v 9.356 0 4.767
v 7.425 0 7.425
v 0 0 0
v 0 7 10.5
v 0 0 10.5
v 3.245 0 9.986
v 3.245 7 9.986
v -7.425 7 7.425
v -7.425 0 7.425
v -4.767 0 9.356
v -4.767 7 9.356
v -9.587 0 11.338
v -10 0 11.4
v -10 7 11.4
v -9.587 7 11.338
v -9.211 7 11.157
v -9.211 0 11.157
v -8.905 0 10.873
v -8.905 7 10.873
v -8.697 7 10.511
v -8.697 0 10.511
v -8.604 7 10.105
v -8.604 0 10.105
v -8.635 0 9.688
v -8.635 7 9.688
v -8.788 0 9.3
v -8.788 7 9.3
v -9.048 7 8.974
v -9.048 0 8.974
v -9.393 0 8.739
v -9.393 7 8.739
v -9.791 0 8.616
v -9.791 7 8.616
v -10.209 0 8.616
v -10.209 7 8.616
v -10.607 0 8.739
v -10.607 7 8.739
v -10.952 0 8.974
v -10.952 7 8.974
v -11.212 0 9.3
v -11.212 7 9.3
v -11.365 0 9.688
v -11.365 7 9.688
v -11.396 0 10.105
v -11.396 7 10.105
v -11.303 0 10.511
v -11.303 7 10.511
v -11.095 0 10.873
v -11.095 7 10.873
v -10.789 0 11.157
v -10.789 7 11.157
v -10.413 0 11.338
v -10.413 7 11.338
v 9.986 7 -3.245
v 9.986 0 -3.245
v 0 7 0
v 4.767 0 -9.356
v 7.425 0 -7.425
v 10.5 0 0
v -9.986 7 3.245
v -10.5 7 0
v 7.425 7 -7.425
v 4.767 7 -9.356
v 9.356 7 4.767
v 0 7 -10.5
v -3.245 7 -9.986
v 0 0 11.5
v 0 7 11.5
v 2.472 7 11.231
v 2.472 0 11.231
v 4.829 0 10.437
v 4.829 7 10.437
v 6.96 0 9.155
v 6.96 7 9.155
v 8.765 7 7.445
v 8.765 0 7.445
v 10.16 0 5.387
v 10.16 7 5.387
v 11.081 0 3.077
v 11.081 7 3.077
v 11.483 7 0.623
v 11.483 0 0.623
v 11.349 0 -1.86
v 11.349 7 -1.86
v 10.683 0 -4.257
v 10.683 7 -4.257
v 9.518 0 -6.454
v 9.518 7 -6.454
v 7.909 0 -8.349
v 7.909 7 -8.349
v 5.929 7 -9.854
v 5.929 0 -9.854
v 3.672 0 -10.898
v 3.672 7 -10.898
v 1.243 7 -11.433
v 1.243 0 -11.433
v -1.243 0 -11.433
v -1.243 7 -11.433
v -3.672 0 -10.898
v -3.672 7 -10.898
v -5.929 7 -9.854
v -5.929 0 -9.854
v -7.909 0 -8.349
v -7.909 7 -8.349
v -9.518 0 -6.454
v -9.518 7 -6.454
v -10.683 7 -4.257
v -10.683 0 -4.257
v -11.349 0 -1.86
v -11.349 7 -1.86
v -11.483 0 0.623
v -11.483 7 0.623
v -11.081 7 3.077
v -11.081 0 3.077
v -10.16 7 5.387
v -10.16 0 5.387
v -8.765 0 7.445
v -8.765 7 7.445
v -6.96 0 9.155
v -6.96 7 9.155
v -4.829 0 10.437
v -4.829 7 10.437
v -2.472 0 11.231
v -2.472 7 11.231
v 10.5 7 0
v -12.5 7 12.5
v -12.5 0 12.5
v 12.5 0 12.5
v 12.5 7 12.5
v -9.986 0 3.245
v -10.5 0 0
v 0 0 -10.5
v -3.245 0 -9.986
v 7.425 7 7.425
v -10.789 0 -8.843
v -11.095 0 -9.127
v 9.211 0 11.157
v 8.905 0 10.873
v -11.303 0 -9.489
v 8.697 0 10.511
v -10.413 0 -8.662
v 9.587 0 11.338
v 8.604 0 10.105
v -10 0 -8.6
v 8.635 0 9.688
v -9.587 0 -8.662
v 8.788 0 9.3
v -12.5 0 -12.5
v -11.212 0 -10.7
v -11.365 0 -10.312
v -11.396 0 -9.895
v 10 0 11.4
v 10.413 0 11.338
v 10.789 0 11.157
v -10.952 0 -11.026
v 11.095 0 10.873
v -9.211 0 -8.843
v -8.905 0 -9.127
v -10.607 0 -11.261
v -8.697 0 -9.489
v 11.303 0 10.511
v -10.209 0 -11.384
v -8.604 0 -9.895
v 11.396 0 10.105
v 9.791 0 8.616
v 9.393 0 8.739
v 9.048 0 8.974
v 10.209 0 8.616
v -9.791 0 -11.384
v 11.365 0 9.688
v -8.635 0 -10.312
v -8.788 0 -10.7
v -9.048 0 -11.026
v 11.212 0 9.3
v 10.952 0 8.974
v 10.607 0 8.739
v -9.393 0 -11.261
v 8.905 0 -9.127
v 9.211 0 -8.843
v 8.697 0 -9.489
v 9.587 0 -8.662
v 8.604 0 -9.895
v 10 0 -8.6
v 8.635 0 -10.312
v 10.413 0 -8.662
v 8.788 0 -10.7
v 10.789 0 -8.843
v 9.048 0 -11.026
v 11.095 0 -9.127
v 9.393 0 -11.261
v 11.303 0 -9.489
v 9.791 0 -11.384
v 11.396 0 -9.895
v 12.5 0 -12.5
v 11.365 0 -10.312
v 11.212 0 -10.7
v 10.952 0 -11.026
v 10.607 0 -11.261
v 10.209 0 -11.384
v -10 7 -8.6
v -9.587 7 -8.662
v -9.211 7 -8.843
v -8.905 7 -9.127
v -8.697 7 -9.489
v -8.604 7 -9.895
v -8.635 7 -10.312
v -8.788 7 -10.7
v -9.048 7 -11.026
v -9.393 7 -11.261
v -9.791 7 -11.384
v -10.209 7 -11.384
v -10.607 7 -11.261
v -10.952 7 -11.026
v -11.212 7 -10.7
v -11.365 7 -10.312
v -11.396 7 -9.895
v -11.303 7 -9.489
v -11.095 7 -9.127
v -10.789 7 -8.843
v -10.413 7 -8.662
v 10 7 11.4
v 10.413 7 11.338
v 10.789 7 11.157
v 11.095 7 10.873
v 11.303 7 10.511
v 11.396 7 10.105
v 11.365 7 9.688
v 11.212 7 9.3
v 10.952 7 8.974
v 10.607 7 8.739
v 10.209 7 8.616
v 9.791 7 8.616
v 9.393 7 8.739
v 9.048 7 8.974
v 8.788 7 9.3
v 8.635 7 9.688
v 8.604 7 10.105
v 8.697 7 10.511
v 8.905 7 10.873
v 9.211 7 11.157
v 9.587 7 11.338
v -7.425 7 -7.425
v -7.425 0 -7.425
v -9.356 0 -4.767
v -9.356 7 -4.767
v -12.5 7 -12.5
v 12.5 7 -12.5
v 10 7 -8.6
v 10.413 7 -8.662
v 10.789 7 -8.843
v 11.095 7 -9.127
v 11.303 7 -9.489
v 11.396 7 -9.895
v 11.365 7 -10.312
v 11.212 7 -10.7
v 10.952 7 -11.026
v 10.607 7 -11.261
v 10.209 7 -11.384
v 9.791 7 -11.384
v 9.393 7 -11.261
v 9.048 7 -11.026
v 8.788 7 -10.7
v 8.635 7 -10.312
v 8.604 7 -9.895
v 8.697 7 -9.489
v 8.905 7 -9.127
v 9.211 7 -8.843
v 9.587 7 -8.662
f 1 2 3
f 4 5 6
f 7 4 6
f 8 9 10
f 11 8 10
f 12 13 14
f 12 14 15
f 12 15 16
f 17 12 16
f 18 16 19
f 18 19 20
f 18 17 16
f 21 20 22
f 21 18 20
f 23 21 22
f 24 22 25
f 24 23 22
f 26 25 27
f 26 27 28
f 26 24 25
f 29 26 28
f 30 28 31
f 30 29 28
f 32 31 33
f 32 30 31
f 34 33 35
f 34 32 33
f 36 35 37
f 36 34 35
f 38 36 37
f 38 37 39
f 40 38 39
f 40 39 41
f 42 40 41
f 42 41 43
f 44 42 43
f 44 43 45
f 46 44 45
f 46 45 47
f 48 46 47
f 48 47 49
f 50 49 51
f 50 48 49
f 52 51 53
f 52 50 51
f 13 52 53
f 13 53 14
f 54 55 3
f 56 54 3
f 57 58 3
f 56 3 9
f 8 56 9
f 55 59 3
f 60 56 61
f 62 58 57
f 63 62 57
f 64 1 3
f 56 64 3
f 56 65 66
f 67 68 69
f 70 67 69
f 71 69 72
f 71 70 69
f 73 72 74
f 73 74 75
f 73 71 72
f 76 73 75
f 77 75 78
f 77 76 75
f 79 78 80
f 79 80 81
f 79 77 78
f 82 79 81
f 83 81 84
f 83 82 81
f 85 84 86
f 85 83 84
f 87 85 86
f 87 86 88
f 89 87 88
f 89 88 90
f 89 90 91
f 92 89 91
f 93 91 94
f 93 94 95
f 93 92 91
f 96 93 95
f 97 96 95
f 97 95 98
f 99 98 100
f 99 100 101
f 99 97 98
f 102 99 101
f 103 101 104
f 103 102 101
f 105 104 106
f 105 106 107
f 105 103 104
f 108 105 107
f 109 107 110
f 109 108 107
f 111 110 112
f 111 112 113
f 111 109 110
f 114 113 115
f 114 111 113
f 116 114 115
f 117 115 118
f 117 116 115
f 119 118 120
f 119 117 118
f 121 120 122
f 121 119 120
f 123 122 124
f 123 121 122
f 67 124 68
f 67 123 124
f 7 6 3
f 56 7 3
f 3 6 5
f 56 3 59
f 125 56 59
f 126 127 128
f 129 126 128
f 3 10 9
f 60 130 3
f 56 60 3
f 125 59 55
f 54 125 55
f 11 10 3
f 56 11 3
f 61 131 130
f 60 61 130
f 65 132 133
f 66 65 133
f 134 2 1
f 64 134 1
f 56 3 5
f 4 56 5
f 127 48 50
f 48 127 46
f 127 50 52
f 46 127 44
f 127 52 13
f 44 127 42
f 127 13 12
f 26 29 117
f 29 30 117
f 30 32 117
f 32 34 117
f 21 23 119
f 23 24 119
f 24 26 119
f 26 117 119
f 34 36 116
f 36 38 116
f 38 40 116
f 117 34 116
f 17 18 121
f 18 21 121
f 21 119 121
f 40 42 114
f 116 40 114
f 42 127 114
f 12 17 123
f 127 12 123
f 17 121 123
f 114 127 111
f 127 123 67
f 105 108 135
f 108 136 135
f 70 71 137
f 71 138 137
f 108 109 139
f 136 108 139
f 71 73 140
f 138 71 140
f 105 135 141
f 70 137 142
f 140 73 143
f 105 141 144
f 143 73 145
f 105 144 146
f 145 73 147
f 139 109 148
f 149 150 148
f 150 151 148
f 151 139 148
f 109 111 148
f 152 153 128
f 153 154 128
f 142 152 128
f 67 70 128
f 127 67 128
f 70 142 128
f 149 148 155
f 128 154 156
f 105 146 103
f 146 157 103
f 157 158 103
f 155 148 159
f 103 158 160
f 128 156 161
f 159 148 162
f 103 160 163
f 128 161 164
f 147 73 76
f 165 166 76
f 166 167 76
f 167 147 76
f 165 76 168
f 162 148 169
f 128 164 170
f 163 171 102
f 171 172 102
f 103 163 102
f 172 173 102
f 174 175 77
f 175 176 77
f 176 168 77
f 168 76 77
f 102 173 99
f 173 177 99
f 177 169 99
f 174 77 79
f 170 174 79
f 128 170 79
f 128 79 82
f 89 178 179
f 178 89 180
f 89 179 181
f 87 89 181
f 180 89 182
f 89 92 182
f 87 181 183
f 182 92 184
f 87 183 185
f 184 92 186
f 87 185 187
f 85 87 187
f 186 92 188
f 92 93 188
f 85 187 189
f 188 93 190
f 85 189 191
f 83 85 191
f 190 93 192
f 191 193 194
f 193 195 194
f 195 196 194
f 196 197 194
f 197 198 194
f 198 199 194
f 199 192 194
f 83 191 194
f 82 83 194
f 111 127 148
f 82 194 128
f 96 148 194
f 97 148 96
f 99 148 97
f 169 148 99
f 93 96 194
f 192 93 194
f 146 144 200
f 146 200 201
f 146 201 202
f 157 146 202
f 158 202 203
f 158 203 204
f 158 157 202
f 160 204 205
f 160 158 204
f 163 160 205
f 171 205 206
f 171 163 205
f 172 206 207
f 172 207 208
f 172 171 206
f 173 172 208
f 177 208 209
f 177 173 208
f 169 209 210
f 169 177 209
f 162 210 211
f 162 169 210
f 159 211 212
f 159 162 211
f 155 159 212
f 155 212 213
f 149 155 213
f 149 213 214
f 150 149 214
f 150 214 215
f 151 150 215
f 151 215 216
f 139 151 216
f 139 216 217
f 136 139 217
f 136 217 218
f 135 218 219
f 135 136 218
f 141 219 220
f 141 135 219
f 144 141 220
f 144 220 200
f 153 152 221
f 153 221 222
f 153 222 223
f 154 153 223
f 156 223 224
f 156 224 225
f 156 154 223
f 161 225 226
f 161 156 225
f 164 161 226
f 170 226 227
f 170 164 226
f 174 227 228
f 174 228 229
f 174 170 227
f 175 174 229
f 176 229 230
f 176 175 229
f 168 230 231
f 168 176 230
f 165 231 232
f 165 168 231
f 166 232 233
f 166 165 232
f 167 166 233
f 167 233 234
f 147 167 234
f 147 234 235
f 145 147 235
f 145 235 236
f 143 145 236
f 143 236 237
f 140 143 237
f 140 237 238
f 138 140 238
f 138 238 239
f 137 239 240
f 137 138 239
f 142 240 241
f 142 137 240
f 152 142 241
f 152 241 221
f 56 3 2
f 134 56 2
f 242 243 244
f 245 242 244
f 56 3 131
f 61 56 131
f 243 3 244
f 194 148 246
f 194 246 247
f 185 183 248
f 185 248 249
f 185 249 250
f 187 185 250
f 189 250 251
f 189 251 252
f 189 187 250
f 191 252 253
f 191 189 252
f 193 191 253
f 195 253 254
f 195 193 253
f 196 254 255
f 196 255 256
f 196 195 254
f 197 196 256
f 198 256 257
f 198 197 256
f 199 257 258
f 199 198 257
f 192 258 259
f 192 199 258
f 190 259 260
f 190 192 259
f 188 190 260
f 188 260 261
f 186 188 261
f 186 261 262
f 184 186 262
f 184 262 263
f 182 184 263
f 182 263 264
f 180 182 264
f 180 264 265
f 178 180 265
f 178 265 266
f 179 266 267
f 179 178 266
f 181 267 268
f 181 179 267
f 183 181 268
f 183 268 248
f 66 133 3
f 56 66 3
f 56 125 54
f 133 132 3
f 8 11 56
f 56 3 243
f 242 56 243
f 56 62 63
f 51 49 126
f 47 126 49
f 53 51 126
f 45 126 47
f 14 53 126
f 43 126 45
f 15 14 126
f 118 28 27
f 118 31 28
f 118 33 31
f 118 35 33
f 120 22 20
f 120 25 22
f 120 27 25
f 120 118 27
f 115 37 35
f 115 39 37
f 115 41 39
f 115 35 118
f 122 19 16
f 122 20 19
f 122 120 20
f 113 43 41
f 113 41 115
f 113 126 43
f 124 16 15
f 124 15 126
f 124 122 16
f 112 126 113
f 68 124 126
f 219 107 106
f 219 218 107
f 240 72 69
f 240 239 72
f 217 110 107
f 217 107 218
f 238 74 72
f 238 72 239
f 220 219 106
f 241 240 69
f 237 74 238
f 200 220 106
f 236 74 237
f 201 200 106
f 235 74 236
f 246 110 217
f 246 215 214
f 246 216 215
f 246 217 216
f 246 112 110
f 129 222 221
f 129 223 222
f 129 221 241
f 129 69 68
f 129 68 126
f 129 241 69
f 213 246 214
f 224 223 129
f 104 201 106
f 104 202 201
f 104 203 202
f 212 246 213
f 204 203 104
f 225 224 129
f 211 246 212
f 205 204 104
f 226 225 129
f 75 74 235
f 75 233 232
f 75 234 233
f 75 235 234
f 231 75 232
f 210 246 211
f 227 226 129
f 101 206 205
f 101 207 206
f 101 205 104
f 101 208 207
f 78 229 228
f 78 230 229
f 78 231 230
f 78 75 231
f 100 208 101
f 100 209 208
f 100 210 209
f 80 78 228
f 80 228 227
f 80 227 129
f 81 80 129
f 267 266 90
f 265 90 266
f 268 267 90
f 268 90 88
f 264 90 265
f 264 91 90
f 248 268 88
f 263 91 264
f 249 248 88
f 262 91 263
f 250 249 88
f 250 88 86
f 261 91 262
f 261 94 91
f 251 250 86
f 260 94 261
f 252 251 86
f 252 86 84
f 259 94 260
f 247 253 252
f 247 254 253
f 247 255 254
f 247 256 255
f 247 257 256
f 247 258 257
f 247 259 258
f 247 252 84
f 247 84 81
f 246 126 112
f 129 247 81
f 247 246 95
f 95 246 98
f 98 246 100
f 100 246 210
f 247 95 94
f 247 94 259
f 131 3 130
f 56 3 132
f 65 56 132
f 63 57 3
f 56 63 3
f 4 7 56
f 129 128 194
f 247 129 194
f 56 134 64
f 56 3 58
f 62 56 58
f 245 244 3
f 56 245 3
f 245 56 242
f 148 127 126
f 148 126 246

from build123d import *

# Parameters (mm, degrees)
SKETCH_1_W        = 25
SKETCH_1_H        = 25
SKETCH_1_R        = 1.4
SKETCH_1_R_2      = 11.5
EXTRUDE_1_DEPTH   = 7
EXTRUDE_2_DEPTH   = 7
EXTRUDE_2_2_DEPTH = 7
EXTRUDE_2_3_DEPTH = 7
EXTRUDE_2_4_DEPTH = 7
EXTRUDE_2_5_DEPTH = 7
EXTRUDE_2_6_DEPTH = 7
EXTRUDE_2_7_DEPTH = 7
EXTRUDE_2_8_DEPTH = 7


with BuildPart() as part:
    # 草图1 → 凸台-拉伸1 (new body)
    with BuildSketch(Plane(origin=(0, 0, 0), x_dir=(1, 0, 0), z_dir=(0, 1, 0))):
        Rectangle(SKETCH_1_W, SKETCH_1_H)
        with Locations(Location((-10, 10, 0), (0, 0, 270))):
            Circle(SKETCH_1_R, mode=Mode.SUBTRACT)
        with Locations(Location((0, 0, 0), (0, 0, 270))):
            Circle(SKETCH_1_R_2, mode=Mode.SUBTRACT)
        with Locations(Location((10, 10, 0), (0, 0, 270))):
            Circle(SKETCH_1_R, mode=Mode.SUBTRACT)
        with Locations(Location((10, -10, 0), (0, 0, 270))):
            Circle(SKETCH_1_R, mode=Mode.SUBTRACT)
        with Locations(Location((-10, -10, 0), (0, 0, 270))):
            Circle(SKETCH_1_R, mode=Mode.SUBTRACT)
    extrude(amount=EXTRUDE_1_DEPTH)


with BuildPart() as body_2:
    # 草图2 → 凸台-拉伸2 (new body)
    with BuildSketch(Plane.XZ):
        Polygon((0, 0), (7.424621202, -7.424621202), (4.766900247, -9.355568504), align=None)
    extrude(amount=-EXTRUDE_2_DEPTH)


with BuildPart() as body_3:
    # 草图2 → Extrude 2 2 (new body)
    with BuildSketch(Plane.XZ):
        Polygon((-3.244678441, -9.986093421), (0, 0), (0, -10.5), align=None)
    extrude(amount=-EXTRUDE_2_2_DEPTH)


with BuildPart() as body_4:
    # 草图2 → Extrude 2 3 (new body)
    with BuildSketch(Plane.XZ):
        Polygon((0, 0), (-7.424621202, -7.424621202), (-9.355568504, -4.766900247), align=None)
    extrude(amount=-EXTRUDE_2_3_DEPTH)


with BuildPart() as body_5:
    # 草图2 → Extrude 2 4 (new body)
    with BuildSketch(Plane.XZ):
        Polygon((0, 0), (-10.5, 0), (-9.986093421, 3.244678441), align=None)
    extrude(amount=-EXTRUDE_2_4_DEPTH)


with BuildPart() as body_6:
    # 草图2 → Extrude 2 5 (new body)
    with BuildSketch(Plane.XZ):
        Polygon((0, 0), (-7.424621202, 7.424621202), (-4.766900247, 9.355568504), align=None)
    extrude(amount=-EXTRUDE_2_5_DEPTH)


with BuildPart() as body_7:
    # 草图2 → Extrude 2 6 (new body)
    with BuildSketch(Plane.XZ):
        Polygon((0, 0), (0, 10.5), (3.244678441, 9.986093421), align=None)
    extrude(amount=-EXTRUDE_2_6_DEPTH)


with BuildPart() as body_8:
    # 草图2 → Extrude 2 7 (new body)
    with BuildSketch(Plane.XZ):
        Polygon((0, 0), (7.424621202, 7.424621202), (9.355568504, 4.766900247), align=None)
    extrude(amount=-EXTRUDE_2_7_DEPTH)


with BuildPart() as body_9:
    # 草图2 → Extrude 2 8 (new body)
    with BuildSketch(Plane.XZ):
        Polygon((0, 0), (10.5, 0), (9.986093421, -3.244678441), align=None)
    extrude(amount=-EXTRUDE_2_8_DEPTH)


solid = Compound([part.part, body_2.part, body_3.part, body_4.part, body_5.part, body_6.part, body_7.part, body_8.part, body_9.part])
